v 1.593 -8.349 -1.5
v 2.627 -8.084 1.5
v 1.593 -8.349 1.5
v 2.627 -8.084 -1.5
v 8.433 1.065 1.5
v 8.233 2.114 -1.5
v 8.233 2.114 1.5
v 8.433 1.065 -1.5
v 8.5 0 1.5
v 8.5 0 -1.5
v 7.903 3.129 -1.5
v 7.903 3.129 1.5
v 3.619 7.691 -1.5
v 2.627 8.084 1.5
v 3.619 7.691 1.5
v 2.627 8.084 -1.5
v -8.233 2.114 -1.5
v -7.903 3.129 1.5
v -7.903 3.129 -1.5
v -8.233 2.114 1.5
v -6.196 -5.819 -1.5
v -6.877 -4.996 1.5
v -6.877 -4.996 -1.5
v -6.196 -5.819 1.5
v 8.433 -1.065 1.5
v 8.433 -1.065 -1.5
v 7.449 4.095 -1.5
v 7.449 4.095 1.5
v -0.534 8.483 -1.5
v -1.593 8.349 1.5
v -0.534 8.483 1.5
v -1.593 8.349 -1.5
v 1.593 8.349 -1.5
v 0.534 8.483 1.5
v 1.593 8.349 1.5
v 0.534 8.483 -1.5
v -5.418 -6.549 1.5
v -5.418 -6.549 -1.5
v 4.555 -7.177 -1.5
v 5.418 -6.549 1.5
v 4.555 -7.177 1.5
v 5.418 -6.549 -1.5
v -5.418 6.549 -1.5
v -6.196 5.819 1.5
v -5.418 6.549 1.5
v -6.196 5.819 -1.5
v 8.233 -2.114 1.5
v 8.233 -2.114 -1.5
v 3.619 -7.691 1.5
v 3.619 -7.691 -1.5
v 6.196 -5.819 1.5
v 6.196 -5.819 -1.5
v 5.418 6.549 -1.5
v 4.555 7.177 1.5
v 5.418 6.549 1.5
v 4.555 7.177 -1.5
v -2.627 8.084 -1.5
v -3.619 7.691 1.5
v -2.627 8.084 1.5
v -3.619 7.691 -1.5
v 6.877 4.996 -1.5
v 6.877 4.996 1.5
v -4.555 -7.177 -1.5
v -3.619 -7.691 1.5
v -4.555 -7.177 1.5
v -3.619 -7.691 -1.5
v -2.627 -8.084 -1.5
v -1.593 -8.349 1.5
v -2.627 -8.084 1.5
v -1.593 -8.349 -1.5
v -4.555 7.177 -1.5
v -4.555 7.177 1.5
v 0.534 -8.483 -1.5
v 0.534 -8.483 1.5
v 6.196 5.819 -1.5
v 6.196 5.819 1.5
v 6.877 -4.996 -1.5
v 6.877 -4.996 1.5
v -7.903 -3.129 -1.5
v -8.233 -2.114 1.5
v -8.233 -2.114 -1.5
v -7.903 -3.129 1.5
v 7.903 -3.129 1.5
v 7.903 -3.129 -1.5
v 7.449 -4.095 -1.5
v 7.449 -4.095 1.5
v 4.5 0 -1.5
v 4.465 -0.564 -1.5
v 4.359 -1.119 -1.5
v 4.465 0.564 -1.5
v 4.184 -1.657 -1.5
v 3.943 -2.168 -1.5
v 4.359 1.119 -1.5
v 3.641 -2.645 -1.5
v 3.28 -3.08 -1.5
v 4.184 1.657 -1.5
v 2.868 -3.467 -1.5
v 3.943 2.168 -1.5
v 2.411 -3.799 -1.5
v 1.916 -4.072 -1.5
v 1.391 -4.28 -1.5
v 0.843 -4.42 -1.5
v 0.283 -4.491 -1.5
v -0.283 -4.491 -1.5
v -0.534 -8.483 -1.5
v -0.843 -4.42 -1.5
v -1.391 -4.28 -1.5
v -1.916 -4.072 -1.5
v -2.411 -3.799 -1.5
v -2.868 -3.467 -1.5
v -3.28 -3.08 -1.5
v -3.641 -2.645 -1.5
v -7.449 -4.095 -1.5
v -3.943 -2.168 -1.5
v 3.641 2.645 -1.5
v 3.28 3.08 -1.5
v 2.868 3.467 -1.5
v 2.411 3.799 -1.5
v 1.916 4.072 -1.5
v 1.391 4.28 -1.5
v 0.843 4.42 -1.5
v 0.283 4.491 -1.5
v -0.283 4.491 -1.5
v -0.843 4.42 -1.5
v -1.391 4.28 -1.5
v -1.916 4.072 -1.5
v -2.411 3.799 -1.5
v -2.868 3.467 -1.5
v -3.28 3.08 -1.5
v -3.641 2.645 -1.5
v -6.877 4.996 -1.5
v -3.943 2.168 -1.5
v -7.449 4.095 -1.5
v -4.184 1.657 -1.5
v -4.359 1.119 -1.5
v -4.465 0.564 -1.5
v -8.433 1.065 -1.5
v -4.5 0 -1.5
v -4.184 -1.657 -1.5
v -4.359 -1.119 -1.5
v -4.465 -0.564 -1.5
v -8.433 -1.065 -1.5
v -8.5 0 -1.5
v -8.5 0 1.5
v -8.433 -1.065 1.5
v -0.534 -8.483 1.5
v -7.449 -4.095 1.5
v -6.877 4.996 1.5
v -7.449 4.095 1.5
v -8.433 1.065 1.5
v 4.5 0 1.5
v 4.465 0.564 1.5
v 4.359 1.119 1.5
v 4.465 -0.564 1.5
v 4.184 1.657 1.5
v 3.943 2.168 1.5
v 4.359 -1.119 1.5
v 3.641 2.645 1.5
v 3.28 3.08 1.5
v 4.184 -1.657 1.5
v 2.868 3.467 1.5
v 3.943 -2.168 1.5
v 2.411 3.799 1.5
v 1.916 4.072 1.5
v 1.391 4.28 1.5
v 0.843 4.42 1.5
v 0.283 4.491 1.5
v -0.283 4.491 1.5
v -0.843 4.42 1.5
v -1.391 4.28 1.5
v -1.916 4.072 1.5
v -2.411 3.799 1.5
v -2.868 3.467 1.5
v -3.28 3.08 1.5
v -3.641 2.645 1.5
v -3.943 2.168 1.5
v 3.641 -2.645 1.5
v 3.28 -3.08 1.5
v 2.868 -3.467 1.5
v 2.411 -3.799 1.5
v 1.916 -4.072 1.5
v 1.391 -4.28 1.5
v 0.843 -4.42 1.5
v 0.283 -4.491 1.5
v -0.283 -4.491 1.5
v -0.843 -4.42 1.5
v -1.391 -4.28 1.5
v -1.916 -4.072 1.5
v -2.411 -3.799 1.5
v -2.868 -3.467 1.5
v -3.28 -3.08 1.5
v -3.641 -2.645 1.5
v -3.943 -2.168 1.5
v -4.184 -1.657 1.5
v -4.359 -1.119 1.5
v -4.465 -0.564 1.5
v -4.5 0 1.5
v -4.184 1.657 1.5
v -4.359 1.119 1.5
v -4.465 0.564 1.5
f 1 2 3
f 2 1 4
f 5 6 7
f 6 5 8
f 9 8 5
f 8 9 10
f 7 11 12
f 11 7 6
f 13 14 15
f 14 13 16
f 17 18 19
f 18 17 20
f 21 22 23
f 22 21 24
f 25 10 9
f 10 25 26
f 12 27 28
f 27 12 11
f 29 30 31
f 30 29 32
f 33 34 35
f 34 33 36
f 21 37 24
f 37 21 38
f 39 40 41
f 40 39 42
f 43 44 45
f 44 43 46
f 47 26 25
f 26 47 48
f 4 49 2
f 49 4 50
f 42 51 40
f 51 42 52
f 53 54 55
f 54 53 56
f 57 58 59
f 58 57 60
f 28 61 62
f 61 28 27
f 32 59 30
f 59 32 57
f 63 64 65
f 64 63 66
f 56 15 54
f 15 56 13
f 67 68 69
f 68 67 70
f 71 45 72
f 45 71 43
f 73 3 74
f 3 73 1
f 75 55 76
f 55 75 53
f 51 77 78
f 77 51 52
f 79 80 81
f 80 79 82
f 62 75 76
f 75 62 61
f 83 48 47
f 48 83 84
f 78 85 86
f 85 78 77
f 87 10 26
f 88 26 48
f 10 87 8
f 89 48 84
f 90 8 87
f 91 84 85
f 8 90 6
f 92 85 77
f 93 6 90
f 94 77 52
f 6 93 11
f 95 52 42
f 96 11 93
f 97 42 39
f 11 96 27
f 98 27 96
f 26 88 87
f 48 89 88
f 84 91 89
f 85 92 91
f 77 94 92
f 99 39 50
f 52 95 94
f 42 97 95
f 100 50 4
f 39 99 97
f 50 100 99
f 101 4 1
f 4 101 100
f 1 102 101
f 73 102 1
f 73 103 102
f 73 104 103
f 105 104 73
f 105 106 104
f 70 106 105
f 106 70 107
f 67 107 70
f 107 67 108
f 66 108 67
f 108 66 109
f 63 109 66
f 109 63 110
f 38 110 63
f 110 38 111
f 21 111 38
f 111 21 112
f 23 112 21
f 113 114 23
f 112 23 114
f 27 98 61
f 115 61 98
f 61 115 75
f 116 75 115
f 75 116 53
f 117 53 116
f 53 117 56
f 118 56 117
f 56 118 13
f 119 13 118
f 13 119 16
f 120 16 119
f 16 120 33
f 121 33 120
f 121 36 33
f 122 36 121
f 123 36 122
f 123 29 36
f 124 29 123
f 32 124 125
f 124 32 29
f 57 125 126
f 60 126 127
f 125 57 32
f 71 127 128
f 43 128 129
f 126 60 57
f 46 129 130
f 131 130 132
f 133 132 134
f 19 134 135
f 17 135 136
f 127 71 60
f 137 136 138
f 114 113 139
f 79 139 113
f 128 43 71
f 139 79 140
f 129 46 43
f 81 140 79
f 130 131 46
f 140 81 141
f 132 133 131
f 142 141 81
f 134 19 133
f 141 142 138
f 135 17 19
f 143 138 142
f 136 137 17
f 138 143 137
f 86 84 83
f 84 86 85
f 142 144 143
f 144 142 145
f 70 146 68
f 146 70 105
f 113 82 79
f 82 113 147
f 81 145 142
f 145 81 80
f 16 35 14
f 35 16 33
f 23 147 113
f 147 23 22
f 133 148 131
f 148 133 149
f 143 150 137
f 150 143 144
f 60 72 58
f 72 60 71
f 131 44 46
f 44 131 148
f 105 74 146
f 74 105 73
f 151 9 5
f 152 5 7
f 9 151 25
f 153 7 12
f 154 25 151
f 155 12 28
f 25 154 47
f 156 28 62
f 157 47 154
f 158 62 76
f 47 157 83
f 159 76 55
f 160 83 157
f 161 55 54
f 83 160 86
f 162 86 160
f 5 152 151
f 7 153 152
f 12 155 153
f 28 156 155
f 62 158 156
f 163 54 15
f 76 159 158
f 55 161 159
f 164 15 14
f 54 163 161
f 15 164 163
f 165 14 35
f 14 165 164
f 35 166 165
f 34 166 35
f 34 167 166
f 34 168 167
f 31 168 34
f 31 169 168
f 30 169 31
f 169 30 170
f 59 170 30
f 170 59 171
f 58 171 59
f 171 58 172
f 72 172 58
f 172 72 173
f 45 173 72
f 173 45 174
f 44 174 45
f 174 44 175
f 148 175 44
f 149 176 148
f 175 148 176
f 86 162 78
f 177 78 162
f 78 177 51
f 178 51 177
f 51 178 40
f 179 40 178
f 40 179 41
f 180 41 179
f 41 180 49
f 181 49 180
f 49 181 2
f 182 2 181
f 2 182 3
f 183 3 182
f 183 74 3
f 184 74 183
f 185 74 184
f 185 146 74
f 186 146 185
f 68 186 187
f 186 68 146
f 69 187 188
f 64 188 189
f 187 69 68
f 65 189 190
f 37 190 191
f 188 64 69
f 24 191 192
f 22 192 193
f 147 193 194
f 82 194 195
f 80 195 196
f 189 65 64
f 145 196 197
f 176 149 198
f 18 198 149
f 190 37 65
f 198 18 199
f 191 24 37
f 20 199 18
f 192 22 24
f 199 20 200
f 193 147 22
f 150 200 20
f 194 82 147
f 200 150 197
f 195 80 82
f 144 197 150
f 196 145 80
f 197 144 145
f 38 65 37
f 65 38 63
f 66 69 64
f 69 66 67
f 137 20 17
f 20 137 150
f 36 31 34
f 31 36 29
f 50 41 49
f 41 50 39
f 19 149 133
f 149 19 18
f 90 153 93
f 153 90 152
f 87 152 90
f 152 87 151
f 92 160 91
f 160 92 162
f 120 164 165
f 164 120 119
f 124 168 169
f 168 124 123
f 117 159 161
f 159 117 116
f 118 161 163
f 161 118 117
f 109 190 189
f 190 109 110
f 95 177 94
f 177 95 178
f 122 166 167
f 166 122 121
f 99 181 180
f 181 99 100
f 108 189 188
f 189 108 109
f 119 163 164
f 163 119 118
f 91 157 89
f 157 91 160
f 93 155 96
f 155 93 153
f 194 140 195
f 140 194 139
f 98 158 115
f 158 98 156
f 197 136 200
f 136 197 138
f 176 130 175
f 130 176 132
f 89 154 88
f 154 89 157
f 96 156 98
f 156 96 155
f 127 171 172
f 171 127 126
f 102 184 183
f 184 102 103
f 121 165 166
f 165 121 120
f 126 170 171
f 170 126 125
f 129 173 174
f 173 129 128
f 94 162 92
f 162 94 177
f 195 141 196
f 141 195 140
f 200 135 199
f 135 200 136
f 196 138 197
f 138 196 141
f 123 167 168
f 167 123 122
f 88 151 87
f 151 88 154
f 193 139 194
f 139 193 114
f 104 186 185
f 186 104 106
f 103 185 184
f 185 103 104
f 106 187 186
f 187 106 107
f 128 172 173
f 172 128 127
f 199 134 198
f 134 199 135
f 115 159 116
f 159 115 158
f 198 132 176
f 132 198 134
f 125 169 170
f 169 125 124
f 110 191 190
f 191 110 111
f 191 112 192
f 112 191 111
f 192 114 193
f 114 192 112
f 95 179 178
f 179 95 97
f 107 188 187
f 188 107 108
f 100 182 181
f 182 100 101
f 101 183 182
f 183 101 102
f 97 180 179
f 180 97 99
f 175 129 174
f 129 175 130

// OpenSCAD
$fn = 50;


difference() {
	union() {
		translate(v = [0, 0, -1.5000000000]) {
			cylinder(h = 3, r = 8.5000000000);
		}
	}
	union() {
		translate(v = [0, 0, -100.0000000000]) {
			cylinder(h = 200, r = 4.5000000000);
		}
	}
}
